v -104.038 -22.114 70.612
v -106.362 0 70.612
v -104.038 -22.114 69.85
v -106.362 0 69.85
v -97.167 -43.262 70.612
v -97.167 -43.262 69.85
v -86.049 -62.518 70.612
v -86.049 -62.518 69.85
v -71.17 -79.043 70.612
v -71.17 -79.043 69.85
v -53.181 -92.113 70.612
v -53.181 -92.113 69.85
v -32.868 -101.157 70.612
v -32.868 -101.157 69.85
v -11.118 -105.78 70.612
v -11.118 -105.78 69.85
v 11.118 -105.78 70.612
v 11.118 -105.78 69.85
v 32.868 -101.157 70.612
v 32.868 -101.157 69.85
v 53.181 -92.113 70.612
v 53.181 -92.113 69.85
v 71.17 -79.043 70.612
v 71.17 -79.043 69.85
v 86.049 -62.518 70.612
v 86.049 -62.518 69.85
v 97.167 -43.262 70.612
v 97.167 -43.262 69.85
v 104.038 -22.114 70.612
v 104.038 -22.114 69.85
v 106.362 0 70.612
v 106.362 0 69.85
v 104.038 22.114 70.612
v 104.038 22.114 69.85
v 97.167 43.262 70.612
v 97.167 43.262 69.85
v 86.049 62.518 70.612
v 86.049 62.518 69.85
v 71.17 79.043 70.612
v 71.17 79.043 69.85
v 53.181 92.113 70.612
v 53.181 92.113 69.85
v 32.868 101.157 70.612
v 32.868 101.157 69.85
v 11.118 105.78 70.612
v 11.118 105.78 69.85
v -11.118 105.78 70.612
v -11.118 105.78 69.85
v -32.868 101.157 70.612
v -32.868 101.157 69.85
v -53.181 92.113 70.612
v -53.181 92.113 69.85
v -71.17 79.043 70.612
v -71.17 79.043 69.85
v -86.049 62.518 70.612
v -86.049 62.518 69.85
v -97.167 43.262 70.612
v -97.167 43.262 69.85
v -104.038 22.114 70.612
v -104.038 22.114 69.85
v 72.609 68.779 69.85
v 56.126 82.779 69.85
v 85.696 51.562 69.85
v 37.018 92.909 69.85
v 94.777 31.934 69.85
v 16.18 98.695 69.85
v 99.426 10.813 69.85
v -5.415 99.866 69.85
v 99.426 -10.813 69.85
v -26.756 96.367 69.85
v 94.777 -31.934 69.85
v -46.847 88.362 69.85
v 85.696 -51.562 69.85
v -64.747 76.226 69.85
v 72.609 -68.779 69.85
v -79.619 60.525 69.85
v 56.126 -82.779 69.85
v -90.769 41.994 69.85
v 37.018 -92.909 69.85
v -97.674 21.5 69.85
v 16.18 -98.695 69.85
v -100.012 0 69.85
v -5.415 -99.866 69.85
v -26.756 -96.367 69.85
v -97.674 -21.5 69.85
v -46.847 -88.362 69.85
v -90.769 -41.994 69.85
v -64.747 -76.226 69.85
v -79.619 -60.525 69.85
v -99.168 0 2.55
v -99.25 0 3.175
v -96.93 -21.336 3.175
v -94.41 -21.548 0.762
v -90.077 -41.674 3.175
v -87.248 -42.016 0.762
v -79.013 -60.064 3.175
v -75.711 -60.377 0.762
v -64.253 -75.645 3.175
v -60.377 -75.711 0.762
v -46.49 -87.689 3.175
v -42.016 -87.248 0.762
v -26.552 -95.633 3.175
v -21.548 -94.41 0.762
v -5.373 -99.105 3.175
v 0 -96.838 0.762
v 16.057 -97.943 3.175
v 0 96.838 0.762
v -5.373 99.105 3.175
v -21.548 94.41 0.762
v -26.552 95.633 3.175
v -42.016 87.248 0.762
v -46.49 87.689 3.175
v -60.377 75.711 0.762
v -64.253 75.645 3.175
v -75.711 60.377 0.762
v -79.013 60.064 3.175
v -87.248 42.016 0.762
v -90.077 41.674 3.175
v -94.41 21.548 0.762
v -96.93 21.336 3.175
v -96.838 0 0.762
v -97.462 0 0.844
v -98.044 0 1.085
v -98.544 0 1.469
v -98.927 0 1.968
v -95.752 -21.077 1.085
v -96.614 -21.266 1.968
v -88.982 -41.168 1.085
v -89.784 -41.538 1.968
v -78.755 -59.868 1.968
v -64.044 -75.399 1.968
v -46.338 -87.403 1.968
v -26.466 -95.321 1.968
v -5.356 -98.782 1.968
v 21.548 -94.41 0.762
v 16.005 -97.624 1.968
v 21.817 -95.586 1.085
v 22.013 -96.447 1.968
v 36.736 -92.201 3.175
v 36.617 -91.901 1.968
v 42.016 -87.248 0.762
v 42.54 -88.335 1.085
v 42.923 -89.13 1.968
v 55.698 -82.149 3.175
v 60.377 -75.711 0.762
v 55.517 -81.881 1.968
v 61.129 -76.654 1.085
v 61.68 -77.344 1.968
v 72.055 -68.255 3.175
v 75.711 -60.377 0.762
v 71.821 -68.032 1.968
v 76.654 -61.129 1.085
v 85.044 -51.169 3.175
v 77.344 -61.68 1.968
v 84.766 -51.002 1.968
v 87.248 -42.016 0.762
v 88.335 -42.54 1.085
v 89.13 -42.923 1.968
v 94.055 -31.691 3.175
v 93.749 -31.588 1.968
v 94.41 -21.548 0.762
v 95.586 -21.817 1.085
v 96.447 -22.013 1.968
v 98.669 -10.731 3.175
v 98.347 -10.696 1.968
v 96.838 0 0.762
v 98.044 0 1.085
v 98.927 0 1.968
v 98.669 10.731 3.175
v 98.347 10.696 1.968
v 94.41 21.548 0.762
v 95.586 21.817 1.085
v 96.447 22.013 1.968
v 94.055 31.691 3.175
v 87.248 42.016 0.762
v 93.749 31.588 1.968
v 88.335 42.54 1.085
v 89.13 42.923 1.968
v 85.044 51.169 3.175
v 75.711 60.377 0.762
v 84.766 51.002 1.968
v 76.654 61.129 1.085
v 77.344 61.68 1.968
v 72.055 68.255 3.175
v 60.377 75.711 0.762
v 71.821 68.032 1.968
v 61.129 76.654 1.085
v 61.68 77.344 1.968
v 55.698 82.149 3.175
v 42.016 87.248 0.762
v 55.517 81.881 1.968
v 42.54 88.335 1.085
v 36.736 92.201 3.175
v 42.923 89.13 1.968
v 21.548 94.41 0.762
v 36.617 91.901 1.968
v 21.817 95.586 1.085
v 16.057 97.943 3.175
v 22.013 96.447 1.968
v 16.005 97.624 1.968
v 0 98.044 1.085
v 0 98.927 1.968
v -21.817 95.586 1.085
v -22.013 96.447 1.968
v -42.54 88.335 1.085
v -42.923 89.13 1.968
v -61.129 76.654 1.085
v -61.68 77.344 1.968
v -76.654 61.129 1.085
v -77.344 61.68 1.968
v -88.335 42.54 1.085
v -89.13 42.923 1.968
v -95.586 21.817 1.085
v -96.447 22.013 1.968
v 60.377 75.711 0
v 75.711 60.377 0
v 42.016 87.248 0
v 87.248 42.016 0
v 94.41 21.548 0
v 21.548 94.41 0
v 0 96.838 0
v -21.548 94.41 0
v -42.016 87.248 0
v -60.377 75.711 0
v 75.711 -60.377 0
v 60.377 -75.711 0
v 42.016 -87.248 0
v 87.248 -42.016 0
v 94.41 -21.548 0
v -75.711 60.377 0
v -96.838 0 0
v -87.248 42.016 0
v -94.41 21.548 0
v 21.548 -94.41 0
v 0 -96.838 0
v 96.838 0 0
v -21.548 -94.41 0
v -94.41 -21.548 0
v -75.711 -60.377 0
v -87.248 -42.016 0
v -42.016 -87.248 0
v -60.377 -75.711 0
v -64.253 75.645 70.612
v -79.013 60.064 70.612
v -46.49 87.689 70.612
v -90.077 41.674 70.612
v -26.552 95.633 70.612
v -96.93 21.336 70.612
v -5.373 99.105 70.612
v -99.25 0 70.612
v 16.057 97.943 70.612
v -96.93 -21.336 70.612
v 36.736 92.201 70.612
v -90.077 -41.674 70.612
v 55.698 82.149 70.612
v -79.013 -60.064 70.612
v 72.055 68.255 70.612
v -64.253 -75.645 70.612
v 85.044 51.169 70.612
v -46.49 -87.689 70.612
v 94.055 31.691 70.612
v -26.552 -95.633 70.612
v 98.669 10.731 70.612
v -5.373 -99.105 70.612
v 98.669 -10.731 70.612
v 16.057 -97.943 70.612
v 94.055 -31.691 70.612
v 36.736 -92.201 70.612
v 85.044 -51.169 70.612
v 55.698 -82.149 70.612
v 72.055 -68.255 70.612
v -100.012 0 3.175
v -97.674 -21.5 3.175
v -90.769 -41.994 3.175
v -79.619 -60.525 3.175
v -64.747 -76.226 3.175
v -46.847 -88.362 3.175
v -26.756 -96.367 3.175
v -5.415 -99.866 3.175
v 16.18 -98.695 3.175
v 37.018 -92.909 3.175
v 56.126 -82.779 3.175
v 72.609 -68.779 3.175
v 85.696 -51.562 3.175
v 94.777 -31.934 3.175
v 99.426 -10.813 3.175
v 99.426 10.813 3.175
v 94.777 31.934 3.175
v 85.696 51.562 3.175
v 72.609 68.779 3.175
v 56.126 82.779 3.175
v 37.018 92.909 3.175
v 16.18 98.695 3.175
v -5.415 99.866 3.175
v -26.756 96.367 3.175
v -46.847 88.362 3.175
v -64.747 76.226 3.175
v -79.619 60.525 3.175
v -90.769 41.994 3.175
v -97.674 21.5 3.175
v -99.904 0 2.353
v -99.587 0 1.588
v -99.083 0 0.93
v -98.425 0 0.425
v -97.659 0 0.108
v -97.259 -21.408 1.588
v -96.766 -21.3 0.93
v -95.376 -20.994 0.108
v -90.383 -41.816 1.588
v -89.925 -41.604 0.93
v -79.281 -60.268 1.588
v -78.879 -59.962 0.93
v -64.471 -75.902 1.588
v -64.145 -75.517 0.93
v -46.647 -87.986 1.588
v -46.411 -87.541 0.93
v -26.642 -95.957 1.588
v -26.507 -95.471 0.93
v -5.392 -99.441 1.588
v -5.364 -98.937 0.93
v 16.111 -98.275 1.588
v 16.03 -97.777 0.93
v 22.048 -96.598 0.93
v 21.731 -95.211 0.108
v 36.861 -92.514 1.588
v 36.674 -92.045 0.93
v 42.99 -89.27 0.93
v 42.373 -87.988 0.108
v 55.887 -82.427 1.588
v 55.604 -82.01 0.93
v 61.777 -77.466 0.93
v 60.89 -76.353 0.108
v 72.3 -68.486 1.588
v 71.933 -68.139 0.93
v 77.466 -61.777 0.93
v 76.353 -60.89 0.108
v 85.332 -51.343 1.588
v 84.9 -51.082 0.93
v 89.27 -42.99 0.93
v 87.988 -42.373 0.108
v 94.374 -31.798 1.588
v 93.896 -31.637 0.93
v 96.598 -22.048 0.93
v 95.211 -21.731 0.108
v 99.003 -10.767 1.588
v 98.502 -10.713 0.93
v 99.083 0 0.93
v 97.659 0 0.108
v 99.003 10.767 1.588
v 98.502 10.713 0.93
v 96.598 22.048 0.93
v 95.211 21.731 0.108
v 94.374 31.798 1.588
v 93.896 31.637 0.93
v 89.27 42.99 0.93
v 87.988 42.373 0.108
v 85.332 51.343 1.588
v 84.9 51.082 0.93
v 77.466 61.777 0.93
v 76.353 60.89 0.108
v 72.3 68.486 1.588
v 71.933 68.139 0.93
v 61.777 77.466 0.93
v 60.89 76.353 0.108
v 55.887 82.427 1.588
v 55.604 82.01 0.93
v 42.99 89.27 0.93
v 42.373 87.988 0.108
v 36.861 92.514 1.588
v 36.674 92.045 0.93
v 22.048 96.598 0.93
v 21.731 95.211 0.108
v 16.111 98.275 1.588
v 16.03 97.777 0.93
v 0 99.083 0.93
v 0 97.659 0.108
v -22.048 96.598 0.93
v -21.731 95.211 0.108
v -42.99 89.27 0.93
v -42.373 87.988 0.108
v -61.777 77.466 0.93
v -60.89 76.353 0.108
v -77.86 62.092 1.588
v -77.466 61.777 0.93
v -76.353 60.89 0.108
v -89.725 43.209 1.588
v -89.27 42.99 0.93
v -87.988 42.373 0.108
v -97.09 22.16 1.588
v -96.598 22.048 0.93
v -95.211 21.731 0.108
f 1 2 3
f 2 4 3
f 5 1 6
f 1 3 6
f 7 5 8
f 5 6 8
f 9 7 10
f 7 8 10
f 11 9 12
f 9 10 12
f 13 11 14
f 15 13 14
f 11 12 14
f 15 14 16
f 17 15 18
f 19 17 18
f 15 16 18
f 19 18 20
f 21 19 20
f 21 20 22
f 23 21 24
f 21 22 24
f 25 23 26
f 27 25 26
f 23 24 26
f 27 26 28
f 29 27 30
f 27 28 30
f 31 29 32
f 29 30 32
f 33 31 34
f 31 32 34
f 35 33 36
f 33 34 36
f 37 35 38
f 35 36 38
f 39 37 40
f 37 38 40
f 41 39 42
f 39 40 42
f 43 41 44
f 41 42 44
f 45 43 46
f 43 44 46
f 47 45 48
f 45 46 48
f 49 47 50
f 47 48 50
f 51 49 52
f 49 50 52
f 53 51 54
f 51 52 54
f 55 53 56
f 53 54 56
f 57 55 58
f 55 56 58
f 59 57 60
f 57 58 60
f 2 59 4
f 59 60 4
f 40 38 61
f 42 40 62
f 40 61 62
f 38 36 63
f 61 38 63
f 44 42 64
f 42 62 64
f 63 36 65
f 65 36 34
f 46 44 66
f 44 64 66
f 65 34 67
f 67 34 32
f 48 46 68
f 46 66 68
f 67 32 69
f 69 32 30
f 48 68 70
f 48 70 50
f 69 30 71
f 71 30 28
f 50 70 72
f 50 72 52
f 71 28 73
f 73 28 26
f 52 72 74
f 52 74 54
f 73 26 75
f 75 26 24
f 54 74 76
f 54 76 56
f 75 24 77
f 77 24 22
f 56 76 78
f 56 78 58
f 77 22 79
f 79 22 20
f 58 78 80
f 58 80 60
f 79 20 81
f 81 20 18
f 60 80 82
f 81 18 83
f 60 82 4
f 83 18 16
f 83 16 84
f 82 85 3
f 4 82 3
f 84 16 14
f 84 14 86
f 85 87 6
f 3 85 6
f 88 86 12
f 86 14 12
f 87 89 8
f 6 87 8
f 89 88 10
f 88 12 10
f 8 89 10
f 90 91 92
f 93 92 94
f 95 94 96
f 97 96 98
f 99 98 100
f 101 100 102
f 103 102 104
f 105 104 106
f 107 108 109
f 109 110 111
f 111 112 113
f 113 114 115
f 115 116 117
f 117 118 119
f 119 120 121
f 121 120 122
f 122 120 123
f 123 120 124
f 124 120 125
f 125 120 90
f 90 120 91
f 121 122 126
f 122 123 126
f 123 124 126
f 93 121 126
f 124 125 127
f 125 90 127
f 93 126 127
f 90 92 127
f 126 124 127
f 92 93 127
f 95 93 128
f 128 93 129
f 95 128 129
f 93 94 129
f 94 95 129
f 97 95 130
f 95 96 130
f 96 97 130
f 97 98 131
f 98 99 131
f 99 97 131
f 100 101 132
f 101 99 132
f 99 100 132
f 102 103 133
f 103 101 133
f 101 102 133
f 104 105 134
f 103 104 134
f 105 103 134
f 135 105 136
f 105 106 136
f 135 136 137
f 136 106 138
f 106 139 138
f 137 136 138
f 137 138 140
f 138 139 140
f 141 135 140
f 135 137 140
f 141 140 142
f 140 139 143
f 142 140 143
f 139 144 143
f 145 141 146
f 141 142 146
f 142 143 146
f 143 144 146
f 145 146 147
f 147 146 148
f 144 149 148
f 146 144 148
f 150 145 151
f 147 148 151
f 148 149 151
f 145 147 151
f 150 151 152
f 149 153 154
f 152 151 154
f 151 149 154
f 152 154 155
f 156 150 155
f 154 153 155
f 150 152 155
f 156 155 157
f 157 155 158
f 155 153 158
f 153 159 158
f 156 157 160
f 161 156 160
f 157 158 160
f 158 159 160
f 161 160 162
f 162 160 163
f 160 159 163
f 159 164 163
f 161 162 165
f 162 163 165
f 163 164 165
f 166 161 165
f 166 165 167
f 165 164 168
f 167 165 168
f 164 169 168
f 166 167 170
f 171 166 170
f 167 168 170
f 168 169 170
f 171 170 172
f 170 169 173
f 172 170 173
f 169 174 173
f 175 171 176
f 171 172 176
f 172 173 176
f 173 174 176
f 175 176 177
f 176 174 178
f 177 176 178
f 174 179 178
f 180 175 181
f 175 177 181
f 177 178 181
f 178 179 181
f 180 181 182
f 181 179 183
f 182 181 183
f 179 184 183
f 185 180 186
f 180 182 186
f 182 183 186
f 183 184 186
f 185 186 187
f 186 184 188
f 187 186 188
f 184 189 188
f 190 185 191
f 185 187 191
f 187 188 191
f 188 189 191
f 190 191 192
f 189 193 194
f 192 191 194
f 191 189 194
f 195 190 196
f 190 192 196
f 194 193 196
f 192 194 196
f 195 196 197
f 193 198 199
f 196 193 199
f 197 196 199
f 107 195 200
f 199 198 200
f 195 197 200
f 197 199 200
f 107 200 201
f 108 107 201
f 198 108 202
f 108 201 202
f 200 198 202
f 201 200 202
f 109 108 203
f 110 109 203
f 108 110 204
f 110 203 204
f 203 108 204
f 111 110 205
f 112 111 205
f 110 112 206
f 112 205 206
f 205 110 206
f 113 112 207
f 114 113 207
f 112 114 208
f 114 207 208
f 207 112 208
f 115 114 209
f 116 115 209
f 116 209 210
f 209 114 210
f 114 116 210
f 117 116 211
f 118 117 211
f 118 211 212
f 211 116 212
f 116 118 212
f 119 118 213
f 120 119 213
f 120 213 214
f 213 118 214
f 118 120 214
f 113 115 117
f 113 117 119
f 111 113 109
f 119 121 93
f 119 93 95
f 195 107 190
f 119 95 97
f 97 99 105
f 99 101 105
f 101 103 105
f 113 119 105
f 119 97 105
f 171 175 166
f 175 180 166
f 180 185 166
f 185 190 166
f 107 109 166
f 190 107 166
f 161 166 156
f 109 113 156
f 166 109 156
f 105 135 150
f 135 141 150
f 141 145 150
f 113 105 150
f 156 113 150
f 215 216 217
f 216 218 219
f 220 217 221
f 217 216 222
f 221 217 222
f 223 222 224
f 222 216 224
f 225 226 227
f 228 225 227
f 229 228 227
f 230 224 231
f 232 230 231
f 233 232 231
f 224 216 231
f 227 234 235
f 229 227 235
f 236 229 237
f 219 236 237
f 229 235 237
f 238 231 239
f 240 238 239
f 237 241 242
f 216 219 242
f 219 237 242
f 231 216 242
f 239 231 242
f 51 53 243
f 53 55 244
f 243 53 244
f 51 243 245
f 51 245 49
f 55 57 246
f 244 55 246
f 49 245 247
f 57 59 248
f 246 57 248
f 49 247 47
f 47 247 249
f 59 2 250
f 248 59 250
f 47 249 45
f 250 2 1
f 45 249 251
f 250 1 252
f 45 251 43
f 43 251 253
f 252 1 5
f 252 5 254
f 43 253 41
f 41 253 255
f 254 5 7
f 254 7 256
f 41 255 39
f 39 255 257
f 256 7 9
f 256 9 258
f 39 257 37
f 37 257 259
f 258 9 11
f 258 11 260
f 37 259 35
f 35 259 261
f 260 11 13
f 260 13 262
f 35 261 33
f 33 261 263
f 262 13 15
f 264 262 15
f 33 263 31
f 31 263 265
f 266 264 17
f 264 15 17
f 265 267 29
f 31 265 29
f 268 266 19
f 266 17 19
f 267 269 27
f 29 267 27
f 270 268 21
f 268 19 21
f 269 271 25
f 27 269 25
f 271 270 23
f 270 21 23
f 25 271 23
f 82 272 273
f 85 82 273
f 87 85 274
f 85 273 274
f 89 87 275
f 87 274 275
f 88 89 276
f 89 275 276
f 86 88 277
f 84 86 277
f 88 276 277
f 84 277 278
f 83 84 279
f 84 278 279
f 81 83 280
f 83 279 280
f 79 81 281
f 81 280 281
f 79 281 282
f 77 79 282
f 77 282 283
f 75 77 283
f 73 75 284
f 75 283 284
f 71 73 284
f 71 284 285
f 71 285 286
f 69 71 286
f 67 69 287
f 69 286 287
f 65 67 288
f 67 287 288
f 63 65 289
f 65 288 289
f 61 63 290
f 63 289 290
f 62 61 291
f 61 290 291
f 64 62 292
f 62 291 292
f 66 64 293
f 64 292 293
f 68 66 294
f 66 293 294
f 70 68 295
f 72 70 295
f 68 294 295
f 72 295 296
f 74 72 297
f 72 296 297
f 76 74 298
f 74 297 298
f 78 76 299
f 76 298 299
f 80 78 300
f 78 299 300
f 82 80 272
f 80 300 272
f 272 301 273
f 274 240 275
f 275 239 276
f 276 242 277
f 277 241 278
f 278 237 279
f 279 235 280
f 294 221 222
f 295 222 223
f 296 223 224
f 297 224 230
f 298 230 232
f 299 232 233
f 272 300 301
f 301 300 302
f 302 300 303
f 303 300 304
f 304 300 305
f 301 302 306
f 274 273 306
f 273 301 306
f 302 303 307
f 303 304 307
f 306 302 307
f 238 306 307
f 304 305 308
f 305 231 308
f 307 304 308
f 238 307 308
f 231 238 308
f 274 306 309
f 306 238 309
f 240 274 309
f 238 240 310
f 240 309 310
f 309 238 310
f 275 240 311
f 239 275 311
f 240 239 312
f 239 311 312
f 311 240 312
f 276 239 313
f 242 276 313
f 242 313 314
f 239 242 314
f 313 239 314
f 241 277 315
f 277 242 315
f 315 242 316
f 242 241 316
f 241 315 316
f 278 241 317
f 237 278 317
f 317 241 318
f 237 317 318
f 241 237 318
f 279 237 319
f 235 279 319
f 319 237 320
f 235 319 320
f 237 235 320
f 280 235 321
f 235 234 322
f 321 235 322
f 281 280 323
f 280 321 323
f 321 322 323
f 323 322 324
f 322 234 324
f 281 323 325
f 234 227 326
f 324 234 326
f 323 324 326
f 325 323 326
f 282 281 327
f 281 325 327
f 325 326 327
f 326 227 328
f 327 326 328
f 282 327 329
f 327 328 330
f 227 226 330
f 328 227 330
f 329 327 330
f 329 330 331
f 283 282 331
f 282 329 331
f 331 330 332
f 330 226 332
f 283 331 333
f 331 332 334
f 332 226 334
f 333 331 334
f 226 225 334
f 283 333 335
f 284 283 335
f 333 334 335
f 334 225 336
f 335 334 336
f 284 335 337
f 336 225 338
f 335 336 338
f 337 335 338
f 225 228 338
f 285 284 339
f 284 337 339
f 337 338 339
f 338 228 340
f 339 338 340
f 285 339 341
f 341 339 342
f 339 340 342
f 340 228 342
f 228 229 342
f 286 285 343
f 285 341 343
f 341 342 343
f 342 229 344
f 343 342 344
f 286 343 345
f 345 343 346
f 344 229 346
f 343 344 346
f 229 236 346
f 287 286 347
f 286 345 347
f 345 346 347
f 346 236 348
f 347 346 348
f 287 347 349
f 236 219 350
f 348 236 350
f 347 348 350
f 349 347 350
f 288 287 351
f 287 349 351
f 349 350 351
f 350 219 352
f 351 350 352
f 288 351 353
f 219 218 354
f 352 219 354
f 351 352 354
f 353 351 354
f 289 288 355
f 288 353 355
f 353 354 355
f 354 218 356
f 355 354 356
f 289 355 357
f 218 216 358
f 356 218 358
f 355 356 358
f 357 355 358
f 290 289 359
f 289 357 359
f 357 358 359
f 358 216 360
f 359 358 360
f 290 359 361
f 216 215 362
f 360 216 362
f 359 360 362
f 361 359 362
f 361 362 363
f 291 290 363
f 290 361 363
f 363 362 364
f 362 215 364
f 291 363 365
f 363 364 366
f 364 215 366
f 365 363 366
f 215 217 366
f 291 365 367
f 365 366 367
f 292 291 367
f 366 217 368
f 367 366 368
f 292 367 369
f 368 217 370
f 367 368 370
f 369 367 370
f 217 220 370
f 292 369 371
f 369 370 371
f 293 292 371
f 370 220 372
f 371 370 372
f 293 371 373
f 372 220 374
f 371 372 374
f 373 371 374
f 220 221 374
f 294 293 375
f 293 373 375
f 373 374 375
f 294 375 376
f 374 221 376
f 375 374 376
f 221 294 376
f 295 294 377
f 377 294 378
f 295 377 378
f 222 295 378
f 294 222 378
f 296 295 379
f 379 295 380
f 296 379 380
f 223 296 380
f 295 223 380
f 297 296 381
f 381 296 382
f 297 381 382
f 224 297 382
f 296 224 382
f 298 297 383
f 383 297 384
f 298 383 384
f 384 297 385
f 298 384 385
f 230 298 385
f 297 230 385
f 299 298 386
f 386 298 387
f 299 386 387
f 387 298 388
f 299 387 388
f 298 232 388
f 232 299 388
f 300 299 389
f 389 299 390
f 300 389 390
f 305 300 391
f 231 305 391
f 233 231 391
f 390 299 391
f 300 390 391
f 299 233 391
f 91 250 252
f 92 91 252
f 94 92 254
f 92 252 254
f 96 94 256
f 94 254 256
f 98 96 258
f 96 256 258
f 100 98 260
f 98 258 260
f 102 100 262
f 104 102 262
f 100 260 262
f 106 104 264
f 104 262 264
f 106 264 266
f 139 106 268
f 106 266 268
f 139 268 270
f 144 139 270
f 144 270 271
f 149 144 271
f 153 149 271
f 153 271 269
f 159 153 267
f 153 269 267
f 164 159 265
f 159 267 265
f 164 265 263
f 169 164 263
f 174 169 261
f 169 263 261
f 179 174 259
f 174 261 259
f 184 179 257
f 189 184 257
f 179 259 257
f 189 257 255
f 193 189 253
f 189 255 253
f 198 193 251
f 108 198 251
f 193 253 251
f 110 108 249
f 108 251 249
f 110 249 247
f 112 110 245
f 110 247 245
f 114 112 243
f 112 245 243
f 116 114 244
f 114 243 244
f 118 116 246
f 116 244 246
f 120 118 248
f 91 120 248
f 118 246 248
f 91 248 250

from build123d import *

# Parameters (mm, degrees)
F2_R = 2.413
F3_R = 3.175


with BuildPart() as f1:
    # F0 (on Front) → F1 (revolve)
    with BuildSketch(Plane.XZ):
        Polygon((-106.3625, 70.612), (-106.3625, 69.85), (-100.0125, 69.85), (-100.0125, 0), (0, 0), (0, 0.762), (-99.2505, 0.762), (-99.2505, 70.612), align=None)
    revolve(axis=Axis((0, 0, 33.215944), (0, 0, 1)))

    # F2
    f2_edges = [f1.edges().sort_by_distance(p)[0] for p in [
        (99.2505, 0, 0.762),
    ]]
    fillet(f2_edges, radius=F2_R)

    # F3
    f3_edges = [f1.edges().sort_by_distance(p)[0] for p in [
        (100.0125, 0, 0),
    ]]
    fillet(f3_edges, radius=F3_R)


solid = f1.part
